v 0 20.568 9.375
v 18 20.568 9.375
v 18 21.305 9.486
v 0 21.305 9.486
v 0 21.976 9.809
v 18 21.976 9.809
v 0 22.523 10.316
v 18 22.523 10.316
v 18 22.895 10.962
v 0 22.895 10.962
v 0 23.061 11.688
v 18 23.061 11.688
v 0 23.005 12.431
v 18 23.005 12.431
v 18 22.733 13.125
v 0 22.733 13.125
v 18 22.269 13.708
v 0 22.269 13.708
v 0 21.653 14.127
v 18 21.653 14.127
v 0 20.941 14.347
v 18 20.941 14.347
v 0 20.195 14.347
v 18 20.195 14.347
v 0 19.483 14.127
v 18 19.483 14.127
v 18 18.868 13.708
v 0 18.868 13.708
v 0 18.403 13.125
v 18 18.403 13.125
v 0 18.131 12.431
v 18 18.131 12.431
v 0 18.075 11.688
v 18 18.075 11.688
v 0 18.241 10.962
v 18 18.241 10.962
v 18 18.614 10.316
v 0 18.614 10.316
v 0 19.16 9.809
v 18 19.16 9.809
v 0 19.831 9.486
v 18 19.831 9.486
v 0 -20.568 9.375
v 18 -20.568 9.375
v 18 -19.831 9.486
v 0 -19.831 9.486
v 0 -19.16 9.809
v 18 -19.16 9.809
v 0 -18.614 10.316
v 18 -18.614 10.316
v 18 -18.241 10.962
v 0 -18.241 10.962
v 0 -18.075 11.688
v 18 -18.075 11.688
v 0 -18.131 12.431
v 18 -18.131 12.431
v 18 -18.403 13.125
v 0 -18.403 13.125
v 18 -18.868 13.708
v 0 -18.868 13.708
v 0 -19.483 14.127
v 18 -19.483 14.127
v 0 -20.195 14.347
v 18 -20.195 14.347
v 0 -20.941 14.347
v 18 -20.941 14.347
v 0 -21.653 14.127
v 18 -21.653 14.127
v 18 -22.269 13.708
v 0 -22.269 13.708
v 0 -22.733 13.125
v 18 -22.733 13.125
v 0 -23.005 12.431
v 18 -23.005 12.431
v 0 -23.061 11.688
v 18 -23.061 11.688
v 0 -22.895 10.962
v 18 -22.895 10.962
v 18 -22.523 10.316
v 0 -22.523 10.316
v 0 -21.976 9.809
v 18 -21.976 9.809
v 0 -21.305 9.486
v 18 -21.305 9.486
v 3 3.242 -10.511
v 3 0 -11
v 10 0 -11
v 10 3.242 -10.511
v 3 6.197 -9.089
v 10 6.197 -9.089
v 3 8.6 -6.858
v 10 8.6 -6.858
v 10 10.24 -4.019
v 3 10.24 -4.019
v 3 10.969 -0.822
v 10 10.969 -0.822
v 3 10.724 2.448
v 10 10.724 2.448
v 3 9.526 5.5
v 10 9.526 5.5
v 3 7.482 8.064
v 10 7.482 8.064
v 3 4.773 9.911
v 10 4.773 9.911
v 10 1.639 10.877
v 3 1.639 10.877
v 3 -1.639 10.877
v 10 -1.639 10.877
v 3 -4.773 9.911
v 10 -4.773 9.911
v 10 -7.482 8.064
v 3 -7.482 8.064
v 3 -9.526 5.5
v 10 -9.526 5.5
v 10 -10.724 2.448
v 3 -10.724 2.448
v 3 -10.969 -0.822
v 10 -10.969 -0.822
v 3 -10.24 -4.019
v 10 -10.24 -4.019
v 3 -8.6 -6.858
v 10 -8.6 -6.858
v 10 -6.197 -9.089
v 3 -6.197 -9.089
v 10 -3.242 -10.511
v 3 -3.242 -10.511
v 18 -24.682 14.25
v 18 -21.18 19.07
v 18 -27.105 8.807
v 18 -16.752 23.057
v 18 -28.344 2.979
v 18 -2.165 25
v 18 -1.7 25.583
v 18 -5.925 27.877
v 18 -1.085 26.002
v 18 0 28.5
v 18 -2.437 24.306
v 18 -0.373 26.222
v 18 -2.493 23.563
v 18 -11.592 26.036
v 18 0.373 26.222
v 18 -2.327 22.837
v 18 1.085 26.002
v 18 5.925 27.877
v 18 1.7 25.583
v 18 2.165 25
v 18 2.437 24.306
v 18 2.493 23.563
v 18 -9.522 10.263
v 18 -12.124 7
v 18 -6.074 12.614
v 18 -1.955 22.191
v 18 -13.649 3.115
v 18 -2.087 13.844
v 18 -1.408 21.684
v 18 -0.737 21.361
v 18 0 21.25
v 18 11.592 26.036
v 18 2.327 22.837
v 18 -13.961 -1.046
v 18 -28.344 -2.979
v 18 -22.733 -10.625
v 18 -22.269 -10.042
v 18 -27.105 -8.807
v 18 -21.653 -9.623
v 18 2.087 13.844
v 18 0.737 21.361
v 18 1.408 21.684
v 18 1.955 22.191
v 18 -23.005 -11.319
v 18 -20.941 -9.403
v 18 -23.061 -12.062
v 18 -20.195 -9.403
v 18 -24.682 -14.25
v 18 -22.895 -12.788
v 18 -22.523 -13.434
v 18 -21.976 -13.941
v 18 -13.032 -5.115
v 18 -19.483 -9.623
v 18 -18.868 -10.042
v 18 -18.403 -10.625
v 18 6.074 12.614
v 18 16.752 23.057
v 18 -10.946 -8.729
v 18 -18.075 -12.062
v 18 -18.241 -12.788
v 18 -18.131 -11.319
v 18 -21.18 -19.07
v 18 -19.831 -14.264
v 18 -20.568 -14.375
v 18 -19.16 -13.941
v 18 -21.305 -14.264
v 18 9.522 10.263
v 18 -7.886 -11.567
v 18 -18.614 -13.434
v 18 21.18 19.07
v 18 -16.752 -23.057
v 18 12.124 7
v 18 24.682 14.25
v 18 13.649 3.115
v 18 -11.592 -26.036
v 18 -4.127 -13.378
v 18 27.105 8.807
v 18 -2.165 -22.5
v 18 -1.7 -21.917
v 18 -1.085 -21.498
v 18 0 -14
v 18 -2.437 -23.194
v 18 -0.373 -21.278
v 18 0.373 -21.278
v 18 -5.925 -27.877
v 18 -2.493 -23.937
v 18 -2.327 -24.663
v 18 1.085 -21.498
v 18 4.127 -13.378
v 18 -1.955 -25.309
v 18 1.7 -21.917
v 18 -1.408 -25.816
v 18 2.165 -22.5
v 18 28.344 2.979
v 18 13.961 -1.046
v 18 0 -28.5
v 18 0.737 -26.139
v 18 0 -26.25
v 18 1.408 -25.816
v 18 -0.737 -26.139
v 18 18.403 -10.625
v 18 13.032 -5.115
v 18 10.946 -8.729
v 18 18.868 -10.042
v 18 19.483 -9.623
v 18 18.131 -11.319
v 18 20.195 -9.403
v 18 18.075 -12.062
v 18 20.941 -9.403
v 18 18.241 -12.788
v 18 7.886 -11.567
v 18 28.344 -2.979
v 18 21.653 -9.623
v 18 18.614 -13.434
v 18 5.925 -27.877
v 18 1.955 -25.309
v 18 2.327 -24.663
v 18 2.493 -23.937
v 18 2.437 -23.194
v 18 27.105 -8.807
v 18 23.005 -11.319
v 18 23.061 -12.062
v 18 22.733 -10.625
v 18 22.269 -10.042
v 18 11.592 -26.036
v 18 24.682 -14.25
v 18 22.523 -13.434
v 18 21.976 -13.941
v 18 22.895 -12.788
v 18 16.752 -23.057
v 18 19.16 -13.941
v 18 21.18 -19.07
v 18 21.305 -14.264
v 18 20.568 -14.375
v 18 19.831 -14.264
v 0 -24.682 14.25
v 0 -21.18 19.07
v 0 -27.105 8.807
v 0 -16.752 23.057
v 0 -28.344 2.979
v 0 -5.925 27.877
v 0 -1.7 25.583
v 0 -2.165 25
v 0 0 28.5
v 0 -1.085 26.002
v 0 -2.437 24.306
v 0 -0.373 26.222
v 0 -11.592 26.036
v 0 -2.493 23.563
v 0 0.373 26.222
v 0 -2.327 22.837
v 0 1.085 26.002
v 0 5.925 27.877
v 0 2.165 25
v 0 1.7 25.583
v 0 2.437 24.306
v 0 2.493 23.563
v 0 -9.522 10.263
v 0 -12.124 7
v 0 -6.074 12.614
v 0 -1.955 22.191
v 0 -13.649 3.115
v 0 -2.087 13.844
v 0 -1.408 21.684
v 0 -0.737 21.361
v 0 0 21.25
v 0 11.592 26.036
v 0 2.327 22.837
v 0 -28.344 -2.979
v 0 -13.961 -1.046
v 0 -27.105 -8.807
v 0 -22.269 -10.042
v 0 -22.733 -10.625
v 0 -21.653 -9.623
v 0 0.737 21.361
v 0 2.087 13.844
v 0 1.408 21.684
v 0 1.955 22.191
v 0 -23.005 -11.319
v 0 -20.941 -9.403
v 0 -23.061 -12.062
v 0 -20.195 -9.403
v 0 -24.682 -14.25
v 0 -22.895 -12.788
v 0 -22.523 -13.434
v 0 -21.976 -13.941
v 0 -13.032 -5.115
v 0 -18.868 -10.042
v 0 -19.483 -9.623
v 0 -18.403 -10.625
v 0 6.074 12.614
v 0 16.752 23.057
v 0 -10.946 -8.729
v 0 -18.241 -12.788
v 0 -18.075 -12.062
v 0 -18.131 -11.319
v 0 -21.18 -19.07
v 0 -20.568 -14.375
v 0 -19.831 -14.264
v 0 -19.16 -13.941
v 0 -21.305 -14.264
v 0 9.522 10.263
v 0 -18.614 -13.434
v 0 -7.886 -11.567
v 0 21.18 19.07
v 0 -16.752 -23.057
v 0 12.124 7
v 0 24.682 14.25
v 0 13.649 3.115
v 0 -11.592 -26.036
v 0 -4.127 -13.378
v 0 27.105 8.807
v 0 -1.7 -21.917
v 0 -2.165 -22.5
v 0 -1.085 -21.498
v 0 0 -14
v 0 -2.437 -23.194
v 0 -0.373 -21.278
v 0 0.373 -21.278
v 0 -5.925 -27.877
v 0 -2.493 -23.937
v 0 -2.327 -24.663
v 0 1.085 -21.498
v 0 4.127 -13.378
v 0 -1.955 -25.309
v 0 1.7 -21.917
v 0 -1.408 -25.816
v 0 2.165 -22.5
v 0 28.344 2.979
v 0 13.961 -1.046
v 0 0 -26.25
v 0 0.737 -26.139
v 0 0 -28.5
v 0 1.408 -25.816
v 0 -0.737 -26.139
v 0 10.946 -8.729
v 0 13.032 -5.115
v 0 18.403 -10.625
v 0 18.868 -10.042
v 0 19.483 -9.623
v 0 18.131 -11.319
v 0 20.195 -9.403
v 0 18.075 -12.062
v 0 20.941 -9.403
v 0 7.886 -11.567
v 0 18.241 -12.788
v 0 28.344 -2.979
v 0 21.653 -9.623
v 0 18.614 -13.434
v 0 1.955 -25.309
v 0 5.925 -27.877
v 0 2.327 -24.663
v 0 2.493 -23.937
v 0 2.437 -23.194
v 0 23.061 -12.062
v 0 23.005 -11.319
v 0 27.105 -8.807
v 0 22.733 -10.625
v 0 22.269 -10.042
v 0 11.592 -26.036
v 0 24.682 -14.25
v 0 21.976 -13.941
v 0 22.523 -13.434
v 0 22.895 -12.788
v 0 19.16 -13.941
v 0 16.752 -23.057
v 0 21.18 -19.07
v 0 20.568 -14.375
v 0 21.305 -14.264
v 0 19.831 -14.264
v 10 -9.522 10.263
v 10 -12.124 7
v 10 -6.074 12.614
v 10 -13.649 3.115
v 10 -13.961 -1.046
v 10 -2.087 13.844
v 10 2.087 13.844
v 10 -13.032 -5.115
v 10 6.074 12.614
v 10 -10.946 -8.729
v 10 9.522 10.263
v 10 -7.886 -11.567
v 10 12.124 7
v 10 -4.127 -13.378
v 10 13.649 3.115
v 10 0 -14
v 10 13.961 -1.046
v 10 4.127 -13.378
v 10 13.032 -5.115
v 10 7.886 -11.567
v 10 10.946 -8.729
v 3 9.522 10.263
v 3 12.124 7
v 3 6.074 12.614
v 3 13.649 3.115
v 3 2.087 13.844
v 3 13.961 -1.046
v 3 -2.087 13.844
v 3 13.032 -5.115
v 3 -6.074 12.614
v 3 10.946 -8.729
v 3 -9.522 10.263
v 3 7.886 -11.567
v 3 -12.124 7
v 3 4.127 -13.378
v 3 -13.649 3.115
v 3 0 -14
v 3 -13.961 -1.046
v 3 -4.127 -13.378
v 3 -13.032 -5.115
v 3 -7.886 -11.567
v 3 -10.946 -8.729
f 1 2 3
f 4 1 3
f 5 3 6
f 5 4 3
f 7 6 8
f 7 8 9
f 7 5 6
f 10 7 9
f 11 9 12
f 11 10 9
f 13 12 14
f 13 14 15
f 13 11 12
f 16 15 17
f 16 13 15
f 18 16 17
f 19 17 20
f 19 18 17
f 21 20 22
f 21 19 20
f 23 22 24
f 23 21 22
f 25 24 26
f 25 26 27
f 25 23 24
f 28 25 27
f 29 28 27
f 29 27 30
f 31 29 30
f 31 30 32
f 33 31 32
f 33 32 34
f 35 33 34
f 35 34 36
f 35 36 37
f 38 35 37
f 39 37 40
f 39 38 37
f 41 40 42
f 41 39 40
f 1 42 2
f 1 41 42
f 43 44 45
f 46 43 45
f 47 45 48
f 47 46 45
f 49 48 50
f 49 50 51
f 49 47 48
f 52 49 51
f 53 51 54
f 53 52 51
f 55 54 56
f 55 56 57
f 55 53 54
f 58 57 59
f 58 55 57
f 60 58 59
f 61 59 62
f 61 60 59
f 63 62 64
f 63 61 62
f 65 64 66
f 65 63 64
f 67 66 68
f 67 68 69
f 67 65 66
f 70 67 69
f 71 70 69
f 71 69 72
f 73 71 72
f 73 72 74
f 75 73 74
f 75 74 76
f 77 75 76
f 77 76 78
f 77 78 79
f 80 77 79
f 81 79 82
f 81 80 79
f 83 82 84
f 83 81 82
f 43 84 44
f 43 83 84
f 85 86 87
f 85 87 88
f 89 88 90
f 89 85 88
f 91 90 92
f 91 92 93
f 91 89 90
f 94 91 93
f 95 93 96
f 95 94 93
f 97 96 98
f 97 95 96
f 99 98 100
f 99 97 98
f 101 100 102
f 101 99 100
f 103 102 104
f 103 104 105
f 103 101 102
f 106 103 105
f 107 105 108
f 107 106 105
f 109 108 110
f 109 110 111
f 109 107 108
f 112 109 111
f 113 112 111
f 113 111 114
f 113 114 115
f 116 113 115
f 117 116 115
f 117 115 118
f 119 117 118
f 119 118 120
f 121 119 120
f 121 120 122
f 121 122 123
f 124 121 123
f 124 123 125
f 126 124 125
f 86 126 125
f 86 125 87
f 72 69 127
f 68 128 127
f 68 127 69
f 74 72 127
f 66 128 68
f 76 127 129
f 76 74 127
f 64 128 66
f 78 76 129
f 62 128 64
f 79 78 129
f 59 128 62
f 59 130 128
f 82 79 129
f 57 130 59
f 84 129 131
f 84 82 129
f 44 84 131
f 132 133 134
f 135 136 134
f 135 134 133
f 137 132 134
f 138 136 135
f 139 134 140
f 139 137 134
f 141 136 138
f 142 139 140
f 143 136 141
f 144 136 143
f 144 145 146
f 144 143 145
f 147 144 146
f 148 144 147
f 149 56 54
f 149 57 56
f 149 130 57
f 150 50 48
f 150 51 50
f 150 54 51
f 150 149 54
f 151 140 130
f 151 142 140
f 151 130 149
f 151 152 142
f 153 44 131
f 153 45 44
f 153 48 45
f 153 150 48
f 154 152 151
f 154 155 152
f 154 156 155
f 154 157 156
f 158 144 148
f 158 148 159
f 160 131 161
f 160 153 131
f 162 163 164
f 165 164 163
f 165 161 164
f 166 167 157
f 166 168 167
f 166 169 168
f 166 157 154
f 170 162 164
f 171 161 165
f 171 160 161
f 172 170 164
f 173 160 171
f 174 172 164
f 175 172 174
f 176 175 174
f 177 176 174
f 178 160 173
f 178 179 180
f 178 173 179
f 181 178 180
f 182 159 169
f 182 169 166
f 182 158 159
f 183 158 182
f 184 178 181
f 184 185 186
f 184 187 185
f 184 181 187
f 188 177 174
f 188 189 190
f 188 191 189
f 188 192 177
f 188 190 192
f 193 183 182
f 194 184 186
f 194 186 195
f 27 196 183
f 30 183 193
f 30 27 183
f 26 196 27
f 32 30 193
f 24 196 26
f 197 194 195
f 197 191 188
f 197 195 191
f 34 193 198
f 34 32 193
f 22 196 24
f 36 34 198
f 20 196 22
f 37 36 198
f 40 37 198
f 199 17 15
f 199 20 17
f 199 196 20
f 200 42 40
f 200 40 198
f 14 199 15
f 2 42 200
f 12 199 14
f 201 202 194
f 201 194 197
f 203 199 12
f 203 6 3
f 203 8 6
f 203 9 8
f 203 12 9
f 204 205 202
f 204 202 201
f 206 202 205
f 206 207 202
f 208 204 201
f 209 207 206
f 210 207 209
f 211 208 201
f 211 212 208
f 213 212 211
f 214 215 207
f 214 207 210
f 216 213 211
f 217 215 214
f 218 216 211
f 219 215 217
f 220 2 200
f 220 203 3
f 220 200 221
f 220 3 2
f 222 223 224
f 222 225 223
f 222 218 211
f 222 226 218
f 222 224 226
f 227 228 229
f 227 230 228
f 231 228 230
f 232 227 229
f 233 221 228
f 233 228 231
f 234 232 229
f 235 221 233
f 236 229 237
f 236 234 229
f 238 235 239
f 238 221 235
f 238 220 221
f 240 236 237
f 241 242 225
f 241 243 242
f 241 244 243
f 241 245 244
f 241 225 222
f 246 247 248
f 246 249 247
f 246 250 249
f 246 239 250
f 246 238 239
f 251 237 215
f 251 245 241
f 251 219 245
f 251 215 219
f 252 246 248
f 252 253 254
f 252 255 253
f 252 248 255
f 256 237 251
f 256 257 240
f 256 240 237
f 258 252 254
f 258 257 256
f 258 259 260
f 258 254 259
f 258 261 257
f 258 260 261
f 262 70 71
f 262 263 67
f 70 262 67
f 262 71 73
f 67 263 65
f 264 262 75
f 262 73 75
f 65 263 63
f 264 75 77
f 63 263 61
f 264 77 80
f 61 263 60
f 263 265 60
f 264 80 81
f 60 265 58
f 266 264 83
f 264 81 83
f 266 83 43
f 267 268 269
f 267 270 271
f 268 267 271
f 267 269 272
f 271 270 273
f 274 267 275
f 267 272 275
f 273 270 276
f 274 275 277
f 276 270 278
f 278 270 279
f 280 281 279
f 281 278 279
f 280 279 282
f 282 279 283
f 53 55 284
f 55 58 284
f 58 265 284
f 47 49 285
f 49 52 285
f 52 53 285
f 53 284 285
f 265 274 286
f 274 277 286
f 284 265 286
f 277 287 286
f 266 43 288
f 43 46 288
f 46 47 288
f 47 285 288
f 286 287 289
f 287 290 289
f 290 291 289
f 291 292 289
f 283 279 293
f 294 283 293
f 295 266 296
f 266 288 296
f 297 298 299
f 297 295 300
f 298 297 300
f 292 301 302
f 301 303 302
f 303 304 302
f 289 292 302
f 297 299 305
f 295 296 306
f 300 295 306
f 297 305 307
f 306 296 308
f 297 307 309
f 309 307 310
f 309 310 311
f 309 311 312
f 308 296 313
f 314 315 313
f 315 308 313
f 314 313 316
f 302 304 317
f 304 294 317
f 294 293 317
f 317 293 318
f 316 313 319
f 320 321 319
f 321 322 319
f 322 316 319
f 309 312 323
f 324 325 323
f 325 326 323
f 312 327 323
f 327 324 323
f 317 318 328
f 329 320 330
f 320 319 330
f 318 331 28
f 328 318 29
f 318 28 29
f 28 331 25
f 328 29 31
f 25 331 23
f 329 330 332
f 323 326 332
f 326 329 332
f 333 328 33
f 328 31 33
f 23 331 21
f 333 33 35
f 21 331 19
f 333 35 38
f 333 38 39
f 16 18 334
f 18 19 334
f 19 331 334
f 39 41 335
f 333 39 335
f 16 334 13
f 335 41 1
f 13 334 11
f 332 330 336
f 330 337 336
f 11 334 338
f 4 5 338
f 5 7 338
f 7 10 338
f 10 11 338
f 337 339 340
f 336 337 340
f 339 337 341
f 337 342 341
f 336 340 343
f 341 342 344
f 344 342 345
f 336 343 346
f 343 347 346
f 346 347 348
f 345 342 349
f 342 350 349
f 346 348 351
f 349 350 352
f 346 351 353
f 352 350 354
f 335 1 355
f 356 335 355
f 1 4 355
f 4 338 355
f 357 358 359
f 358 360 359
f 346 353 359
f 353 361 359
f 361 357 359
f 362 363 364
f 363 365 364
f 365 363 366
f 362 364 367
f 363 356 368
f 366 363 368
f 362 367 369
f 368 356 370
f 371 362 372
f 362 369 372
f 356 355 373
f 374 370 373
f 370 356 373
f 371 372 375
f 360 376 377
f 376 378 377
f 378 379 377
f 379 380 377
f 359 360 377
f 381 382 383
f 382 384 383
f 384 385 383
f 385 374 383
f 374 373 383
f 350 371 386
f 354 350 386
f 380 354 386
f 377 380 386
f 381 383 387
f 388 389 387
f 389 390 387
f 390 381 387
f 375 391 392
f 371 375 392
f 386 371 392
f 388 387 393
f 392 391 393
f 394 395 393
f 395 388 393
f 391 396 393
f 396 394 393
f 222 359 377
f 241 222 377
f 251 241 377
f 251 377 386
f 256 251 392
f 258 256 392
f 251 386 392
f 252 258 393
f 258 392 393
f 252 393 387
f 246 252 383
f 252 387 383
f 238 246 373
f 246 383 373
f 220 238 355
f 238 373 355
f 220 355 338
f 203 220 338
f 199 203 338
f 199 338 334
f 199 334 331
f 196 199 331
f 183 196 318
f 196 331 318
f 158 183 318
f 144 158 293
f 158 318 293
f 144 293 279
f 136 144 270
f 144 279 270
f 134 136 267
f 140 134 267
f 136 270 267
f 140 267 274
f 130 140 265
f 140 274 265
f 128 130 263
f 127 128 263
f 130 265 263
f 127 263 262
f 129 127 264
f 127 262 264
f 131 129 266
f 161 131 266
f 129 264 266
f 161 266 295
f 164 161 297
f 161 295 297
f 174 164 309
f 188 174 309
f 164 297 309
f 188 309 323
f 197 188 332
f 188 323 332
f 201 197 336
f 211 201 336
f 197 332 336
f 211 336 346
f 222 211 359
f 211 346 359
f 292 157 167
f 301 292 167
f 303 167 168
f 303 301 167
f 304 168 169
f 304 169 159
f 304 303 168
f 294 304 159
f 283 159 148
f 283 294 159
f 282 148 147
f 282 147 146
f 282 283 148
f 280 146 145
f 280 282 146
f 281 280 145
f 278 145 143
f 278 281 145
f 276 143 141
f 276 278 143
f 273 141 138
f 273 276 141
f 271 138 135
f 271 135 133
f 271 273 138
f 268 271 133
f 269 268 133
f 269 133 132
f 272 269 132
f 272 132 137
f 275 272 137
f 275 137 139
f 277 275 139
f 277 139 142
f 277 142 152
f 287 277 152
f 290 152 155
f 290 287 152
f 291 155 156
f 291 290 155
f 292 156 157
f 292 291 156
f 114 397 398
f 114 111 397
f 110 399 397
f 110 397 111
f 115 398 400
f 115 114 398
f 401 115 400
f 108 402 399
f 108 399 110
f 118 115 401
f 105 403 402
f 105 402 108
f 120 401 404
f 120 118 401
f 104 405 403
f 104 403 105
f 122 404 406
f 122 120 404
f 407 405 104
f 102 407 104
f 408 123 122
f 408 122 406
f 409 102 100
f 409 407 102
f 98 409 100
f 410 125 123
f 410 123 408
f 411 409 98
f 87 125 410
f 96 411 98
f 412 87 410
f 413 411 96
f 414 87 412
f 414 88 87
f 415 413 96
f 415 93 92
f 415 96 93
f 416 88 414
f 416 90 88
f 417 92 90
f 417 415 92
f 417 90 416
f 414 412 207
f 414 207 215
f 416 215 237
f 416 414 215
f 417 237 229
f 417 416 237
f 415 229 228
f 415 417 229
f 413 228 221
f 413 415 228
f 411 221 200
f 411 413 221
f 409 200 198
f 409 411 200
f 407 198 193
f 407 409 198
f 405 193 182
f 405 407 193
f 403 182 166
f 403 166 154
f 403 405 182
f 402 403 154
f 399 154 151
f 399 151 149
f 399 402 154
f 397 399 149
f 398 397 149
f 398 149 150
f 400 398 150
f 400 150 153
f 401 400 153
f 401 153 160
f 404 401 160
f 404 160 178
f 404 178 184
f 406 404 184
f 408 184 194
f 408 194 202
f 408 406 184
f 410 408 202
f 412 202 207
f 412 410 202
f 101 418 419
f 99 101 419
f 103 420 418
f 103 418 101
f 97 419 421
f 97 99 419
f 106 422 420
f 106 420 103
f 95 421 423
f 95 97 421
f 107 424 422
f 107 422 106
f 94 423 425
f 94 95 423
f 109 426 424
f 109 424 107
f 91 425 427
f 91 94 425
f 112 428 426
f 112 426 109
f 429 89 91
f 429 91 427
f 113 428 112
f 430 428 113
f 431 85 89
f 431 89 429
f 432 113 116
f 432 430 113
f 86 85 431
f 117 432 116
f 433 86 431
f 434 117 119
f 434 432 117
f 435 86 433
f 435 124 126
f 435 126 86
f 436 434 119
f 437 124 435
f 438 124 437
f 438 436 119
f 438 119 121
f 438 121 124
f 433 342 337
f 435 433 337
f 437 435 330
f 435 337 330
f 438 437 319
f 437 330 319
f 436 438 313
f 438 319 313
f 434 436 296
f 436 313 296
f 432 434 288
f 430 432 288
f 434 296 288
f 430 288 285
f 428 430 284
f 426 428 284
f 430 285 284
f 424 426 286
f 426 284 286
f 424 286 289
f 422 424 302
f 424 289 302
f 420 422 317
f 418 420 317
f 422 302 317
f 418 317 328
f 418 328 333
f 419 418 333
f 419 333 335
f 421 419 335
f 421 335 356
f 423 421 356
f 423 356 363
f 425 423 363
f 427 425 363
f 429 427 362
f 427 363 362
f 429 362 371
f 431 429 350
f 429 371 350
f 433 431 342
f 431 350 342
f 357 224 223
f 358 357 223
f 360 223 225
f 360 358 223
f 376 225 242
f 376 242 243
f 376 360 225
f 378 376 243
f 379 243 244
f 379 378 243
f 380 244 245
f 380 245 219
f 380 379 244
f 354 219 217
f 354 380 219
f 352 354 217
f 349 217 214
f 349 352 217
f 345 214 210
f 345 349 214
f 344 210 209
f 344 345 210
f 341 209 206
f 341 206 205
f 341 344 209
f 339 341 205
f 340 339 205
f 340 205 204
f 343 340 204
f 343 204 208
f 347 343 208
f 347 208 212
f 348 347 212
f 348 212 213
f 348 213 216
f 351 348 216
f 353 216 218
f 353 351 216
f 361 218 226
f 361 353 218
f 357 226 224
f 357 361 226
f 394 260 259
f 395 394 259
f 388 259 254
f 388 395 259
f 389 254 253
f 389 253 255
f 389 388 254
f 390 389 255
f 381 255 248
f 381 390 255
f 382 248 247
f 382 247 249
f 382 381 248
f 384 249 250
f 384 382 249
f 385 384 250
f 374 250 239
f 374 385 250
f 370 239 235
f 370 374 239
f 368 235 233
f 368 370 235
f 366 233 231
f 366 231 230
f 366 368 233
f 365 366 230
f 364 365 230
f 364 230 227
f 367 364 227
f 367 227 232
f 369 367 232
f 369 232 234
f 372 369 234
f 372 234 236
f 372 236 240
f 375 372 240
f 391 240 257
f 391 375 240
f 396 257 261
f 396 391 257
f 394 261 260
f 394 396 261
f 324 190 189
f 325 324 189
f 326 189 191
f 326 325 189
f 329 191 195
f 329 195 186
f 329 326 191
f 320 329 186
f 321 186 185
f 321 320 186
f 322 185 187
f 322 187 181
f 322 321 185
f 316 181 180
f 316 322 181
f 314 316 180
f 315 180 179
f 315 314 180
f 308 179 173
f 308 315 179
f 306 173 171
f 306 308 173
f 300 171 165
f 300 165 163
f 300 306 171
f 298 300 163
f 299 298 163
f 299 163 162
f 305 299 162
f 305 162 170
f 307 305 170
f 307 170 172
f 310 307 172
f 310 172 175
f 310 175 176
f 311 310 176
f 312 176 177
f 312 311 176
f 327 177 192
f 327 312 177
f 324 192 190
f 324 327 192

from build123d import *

# Parameters (mm, degrees)
SKETCH1_R           = 28.5
SKETCH1_R_2         = 11
SKETCH1_R_3         = 2.5
BOSS_EXTRUDE1_DEPTH = 18
CUT_EXTRUDE1_START  = -8
SKETCH2_R           = 14
SKETCH2_R_2         = 11
CUT_EXTRUDE1_DEPTH  = 8
SKETCH3_R           = 14
SKETCH3_R_2         = 11
CUT_EXTRUDE2_DEPTH  = 3


with BuildPart() as part:
    # Sketch1 → Boss-Extrude1 (new body)
    with BuildSketch(Plane(origin=(0, 0, 0), x_dir=(0, 0, -1), z_dir=(1, 0, 0))):
        Circle(SKETCH1_R)
        Circle(SKETCH1_R_2, mode=Mode.SUBTRACT)
        with Locations((-23.75, 0)):
            Circle(SKETCH1_R_3, mode=Mode.SUBTRACT)
        with Locations((-11.875, 20.56810334)):
            Circle(SKETCH1_R_3, mode=Mode.SUBTRACT)
        with Locations((11.875, 20.56810334)):
            Circle(SKETCH1_R_3, mode=Mode.SUBTRACT)
        with Locations((23.75, 0)):
            Circle(SKETCH1_R_3, mode=Mode.SUBTRACT)
        with Locations((11.875, -20.56810334)):
            Circle(SKETCH1_R_3, mode=Mode.SUBTRACT)
        with Locations((-11.875, -20.56810334)):
            Circle(SKETCH1_R_3, mode=Mode.SUBTRACT)
    extrude(amount=BOSS_EXTRUDE1_DEPTH)

    # Sketch2 → Cut-Extrude1 (cut)
    with BuildSketch(Plane(origin=(18, 0, 0), x_dir=(0, 0, -1), z_dir=(1, 0, 0)).offset(CUT_EXTRUDE1_START)):
        Circle(SKETCH2_R)
        Circle(SKETCH2_R_2, mode=Mode.SUBTRACT)
    extrude(amount=CUT_EXTRUDE1_DEPTH, mode=Mode.SUBTRACT)

    # Sketch3 → Cut-Extrude2 (cut)
    with BuildSketch(Plane.ZY):
        with Locations(Location((0, 0, 0), (0, 0, 180))):
            Circle(SKETCH3_R)
        Circle(SKETCH3_R_2, mode=Mode.SUBTRACT)
    extrude(amount=-CUT_EXTRUDE2_DEPTH, mode=Mode.SUBTRACT)


solid = part.part
